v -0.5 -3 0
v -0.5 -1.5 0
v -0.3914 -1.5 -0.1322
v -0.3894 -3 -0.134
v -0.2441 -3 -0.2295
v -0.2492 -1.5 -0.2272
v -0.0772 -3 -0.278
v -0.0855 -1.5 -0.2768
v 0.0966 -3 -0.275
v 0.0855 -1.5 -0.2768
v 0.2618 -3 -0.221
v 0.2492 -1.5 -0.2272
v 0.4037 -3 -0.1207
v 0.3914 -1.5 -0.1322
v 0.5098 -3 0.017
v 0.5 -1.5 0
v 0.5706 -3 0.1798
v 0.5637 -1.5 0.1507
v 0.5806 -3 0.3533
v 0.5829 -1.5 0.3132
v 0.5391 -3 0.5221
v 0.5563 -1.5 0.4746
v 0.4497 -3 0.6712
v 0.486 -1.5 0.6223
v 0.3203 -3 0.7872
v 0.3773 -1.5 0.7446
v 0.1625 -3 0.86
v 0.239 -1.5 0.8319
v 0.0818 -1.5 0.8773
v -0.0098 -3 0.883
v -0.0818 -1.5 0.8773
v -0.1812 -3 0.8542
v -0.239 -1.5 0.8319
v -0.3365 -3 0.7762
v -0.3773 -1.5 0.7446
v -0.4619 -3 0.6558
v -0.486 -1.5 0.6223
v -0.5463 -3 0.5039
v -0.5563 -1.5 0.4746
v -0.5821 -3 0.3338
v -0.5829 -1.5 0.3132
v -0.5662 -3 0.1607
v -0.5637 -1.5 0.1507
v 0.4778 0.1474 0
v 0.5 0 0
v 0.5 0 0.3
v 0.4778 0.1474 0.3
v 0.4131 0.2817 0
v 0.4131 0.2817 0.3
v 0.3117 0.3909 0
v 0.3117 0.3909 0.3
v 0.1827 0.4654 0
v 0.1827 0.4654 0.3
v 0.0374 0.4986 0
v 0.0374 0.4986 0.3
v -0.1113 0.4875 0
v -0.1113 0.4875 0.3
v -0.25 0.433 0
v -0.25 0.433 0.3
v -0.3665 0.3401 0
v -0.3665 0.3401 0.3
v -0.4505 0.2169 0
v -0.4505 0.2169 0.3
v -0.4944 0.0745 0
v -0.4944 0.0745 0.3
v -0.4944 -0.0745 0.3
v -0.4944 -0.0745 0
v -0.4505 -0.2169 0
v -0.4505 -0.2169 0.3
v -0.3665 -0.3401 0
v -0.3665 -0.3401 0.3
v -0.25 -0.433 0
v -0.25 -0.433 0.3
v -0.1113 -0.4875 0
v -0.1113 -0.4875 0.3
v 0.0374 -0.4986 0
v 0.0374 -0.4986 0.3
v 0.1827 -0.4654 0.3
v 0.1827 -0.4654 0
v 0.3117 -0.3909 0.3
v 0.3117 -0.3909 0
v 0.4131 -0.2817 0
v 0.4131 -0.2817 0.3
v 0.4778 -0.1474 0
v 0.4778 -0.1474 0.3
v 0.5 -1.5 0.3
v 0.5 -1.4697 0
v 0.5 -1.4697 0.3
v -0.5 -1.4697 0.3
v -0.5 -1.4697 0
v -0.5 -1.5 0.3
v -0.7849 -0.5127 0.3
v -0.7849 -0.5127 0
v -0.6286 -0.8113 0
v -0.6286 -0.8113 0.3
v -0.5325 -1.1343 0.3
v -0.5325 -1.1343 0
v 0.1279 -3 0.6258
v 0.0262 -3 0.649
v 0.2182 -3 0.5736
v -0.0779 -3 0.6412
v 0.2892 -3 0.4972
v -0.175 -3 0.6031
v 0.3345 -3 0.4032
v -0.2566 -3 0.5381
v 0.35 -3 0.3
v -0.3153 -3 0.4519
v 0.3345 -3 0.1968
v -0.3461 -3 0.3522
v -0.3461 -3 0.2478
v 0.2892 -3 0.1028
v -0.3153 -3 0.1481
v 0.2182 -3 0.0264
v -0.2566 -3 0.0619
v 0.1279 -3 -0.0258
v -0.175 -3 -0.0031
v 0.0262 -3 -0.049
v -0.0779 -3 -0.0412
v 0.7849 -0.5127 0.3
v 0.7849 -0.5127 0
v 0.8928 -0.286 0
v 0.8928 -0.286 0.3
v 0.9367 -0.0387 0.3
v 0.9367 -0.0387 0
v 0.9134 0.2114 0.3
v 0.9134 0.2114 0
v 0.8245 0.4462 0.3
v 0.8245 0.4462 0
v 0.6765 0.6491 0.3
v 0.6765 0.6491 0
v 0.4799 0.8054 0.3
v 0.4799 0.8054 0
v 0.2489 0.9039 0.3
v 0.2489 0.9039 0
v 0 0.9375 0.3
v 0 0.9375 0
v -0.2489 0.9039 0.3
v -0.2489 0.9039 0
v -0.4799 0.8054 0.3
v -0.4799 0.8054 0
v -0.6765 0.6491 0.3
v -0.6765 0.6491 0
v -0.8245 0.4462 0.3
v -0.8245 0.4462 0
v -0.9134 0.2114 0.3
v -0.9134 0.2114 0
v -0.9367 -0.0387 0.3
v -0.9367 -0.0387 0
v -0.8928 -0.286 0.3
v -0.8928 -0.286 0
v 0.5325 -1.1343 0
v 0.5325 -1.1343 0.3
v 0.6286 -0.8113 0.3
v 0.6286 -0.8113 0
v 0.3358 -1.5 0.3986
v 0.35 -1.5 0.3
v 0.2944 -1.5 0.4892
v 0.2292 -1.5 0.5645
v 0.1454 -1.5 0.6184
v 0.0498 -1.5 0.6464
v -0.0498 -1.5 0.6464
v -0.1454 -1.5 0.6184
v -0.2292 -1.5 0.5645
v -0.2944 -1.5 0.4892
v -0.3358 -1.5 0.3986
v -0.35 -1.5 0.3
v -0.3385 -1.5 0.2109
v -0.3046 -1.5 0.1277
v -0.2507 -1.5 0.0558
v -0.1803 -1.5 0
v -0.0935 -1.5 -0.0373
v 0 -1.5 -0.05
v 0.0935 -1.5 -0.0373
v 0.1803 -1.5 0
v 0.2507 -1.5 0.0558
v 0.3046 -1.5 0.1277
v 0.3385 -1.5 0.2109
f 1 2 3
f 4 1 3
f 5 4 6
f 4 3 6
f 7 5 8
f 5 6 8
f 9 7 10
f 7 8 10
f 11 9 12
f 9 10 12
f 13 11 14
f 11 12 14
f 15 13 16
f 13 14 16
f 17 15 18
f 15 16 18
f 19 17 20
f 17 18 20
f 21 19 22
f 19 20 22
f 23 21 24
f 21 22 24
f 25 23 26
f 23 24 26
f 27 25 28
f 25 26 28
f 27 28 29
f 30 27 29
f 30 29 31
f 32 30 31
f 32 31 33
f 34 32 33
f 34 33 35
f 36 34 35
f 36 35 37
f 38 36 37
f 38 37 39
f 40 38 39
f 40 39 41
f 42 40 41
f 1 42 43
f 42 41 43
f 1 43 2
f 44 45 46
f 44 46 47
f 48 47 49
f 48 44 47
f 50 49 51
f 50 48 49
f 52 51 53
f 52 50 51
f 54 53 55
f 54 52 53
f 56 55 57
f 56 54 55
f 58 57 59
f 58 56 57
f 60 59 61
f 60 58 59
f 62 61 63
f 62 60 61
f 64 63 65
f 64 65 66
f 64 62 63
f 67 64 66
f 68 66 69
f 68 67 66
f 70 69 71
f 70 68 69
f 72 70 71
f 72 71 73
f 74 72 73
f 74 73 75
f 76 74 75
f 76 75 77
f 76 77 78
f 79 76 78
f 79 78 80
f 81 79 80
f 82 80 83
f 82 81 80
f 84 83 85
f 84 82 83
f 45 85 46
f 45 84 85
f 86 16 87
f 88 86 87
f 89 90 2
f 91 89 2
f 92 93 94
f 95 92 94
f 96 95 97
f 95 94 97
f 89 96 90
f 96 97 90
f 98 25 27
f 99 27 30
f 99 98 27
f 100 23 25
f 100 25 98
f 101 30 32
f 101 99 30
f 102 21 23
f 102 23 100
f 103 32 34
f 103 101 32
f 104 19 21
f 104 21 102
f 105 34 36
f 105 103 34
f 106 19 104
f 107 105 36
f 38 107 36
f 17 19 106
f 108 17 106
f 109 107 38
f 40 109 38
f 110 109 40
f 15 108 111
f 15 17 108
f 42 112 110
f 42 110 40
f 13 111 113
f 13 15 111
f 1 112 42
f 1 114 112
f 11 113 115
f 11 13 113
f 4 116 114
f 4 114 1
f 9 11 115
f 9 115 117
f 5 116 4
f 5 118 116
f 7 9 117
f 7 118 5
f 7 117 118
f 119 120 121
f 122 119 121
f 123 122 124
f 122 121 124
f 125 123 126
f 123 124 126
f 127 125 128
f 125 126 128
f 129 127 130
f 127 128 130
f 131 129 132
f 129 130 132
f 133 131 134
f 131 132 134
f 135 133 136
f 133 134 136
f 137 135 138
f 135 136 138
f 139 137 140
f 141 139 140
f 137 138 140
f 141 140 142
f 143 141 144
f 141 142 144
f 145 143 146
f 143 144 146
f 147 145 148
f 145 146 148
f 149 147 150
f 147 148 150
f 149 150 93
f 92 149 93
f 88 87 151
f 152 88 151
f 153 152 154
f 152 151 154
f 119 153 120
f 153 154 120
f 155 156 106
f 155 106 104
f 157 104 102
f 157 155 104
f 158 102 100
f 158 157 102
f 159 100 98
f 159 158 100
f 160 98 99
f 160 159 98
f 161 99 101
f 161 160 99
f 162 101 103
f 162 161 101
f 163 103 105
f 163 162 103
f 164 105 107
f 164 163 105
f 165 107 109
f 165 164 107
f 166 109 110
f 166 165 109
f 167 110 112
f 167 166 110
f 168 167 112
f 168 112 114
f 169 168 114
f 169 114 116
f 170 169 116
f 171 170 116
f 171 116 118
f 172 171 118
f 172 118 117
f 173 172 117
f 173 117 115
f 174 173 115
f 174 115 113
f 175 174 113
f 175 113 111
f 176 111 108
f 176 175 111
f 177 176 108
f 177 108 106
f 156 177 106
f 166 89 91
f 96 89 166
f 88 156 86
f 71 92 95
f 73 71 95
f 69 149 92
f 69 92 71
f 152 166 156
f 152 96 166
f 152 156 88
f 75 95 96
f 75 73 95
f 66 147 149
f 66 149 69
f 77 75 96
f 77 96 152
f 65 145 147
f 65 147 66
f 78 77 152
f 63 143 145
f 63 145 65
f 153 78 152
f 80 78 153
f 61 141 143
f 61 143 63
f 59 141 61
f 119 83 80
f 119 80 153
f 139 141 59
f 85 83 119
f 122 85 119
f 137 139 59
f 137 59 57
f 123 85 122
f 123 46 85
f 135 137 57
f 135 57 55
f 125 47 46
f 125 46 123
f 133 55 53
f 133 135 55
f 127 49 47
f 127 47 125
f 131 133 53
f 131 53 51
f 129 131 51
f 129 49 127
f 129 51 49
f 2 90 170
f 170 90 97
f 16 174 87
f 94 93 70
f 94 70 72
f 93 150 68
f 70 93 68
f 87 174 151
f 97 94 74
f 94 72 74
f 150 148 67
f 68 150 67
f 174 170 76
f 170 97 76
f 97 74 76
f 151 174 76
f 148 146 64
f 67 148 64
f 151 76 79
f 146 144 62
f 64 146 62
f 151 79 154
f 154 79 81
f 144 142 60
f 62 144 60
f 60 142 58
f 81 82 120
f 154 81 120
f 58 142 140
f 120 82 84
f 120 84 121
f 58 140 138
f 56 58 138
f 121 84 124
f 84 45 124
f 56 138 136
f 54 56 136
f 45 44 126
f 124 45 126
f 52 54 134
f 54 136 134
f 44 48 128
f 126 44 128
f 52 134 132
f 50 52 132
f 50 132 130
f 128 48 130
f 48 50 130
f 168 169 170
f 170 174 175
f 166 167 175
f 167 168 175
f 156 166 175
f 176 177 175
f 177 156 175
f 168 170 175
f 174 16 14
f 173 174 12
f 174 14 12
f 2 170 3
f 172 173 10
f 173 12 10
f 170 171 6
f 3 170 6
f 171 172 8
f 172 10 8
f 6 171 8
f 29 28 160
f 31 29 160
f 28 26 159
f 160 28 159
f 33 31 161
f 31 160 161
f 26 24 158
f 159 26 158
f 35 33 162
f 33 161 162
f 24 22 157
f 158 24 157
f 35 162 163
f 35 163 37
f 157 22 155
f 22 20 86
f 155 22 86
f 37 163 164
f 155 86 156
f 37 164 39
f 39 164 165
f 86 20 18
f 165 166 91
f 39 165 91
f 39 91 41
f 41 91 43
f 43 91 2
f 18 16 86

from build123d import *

# Parameters (mm, degrees)
SKETCH_1_R      = 0.5
EXTRUDE_1_DEPTH = 0.3
SKETCH_16_R     = 0.583095189
SKETCH_16_R_2   = 0.35
EXTRUDE_5_DEPTH = 1.5


with BuildPart() as part:
    # ｽｹｯﾁ1 → ﾎﾞｽ - 押し出し1 (new body)
    with BuildSketch(Plane.XY):
        with BuildLine():
            Line((-0.5, -1.5), (0.5, -1.5))
            Line((0.5, -1.5), (0.5, -1.469747002))
            ThreePointArc((0.5, -1.469747002), (0.572732358, -0.970474275), (0.784883721, -0.512702443))
            ThreePointArc((0.784883721, -0.512702443), (0, 0.9375), (-0.784883721, -0.512702443))
            ThreePointArc((-0.784883721, -0.512702443), (-0.572732358, -0.970474275), (-0.5, -1.469747002))
            Line((-0.5, -1.469747002), (-0.5, -1.5))
        make_face()
        Circle(SKETCH_1_R, mode=Mode.SUBTRACT)
    extrude(amount=EXTRUDE_1_DEPTH)

    # ｽｹｯﾁ16 → ﾎﾞｽ - 押し出し5 (add)
    with BuildSketch(Plane(origin=(0, -1.5, 0), x_dir=(-1, 0, 0), z_dir=(0, -1, 0))):
        with Locations(Location((0, -0.3, 0), (0, 0, 30.963756532))):
            Circle(SKETCH_16_R)
        with Locations(Location((0, -0.3, 0), (0, 0, 180))):
            Circle(SKETCH_16_R_2, mode=Mode.SUBTRACT)
    extrude(amount=EXTRUDE_5_DEPTH)


solid = part.part
